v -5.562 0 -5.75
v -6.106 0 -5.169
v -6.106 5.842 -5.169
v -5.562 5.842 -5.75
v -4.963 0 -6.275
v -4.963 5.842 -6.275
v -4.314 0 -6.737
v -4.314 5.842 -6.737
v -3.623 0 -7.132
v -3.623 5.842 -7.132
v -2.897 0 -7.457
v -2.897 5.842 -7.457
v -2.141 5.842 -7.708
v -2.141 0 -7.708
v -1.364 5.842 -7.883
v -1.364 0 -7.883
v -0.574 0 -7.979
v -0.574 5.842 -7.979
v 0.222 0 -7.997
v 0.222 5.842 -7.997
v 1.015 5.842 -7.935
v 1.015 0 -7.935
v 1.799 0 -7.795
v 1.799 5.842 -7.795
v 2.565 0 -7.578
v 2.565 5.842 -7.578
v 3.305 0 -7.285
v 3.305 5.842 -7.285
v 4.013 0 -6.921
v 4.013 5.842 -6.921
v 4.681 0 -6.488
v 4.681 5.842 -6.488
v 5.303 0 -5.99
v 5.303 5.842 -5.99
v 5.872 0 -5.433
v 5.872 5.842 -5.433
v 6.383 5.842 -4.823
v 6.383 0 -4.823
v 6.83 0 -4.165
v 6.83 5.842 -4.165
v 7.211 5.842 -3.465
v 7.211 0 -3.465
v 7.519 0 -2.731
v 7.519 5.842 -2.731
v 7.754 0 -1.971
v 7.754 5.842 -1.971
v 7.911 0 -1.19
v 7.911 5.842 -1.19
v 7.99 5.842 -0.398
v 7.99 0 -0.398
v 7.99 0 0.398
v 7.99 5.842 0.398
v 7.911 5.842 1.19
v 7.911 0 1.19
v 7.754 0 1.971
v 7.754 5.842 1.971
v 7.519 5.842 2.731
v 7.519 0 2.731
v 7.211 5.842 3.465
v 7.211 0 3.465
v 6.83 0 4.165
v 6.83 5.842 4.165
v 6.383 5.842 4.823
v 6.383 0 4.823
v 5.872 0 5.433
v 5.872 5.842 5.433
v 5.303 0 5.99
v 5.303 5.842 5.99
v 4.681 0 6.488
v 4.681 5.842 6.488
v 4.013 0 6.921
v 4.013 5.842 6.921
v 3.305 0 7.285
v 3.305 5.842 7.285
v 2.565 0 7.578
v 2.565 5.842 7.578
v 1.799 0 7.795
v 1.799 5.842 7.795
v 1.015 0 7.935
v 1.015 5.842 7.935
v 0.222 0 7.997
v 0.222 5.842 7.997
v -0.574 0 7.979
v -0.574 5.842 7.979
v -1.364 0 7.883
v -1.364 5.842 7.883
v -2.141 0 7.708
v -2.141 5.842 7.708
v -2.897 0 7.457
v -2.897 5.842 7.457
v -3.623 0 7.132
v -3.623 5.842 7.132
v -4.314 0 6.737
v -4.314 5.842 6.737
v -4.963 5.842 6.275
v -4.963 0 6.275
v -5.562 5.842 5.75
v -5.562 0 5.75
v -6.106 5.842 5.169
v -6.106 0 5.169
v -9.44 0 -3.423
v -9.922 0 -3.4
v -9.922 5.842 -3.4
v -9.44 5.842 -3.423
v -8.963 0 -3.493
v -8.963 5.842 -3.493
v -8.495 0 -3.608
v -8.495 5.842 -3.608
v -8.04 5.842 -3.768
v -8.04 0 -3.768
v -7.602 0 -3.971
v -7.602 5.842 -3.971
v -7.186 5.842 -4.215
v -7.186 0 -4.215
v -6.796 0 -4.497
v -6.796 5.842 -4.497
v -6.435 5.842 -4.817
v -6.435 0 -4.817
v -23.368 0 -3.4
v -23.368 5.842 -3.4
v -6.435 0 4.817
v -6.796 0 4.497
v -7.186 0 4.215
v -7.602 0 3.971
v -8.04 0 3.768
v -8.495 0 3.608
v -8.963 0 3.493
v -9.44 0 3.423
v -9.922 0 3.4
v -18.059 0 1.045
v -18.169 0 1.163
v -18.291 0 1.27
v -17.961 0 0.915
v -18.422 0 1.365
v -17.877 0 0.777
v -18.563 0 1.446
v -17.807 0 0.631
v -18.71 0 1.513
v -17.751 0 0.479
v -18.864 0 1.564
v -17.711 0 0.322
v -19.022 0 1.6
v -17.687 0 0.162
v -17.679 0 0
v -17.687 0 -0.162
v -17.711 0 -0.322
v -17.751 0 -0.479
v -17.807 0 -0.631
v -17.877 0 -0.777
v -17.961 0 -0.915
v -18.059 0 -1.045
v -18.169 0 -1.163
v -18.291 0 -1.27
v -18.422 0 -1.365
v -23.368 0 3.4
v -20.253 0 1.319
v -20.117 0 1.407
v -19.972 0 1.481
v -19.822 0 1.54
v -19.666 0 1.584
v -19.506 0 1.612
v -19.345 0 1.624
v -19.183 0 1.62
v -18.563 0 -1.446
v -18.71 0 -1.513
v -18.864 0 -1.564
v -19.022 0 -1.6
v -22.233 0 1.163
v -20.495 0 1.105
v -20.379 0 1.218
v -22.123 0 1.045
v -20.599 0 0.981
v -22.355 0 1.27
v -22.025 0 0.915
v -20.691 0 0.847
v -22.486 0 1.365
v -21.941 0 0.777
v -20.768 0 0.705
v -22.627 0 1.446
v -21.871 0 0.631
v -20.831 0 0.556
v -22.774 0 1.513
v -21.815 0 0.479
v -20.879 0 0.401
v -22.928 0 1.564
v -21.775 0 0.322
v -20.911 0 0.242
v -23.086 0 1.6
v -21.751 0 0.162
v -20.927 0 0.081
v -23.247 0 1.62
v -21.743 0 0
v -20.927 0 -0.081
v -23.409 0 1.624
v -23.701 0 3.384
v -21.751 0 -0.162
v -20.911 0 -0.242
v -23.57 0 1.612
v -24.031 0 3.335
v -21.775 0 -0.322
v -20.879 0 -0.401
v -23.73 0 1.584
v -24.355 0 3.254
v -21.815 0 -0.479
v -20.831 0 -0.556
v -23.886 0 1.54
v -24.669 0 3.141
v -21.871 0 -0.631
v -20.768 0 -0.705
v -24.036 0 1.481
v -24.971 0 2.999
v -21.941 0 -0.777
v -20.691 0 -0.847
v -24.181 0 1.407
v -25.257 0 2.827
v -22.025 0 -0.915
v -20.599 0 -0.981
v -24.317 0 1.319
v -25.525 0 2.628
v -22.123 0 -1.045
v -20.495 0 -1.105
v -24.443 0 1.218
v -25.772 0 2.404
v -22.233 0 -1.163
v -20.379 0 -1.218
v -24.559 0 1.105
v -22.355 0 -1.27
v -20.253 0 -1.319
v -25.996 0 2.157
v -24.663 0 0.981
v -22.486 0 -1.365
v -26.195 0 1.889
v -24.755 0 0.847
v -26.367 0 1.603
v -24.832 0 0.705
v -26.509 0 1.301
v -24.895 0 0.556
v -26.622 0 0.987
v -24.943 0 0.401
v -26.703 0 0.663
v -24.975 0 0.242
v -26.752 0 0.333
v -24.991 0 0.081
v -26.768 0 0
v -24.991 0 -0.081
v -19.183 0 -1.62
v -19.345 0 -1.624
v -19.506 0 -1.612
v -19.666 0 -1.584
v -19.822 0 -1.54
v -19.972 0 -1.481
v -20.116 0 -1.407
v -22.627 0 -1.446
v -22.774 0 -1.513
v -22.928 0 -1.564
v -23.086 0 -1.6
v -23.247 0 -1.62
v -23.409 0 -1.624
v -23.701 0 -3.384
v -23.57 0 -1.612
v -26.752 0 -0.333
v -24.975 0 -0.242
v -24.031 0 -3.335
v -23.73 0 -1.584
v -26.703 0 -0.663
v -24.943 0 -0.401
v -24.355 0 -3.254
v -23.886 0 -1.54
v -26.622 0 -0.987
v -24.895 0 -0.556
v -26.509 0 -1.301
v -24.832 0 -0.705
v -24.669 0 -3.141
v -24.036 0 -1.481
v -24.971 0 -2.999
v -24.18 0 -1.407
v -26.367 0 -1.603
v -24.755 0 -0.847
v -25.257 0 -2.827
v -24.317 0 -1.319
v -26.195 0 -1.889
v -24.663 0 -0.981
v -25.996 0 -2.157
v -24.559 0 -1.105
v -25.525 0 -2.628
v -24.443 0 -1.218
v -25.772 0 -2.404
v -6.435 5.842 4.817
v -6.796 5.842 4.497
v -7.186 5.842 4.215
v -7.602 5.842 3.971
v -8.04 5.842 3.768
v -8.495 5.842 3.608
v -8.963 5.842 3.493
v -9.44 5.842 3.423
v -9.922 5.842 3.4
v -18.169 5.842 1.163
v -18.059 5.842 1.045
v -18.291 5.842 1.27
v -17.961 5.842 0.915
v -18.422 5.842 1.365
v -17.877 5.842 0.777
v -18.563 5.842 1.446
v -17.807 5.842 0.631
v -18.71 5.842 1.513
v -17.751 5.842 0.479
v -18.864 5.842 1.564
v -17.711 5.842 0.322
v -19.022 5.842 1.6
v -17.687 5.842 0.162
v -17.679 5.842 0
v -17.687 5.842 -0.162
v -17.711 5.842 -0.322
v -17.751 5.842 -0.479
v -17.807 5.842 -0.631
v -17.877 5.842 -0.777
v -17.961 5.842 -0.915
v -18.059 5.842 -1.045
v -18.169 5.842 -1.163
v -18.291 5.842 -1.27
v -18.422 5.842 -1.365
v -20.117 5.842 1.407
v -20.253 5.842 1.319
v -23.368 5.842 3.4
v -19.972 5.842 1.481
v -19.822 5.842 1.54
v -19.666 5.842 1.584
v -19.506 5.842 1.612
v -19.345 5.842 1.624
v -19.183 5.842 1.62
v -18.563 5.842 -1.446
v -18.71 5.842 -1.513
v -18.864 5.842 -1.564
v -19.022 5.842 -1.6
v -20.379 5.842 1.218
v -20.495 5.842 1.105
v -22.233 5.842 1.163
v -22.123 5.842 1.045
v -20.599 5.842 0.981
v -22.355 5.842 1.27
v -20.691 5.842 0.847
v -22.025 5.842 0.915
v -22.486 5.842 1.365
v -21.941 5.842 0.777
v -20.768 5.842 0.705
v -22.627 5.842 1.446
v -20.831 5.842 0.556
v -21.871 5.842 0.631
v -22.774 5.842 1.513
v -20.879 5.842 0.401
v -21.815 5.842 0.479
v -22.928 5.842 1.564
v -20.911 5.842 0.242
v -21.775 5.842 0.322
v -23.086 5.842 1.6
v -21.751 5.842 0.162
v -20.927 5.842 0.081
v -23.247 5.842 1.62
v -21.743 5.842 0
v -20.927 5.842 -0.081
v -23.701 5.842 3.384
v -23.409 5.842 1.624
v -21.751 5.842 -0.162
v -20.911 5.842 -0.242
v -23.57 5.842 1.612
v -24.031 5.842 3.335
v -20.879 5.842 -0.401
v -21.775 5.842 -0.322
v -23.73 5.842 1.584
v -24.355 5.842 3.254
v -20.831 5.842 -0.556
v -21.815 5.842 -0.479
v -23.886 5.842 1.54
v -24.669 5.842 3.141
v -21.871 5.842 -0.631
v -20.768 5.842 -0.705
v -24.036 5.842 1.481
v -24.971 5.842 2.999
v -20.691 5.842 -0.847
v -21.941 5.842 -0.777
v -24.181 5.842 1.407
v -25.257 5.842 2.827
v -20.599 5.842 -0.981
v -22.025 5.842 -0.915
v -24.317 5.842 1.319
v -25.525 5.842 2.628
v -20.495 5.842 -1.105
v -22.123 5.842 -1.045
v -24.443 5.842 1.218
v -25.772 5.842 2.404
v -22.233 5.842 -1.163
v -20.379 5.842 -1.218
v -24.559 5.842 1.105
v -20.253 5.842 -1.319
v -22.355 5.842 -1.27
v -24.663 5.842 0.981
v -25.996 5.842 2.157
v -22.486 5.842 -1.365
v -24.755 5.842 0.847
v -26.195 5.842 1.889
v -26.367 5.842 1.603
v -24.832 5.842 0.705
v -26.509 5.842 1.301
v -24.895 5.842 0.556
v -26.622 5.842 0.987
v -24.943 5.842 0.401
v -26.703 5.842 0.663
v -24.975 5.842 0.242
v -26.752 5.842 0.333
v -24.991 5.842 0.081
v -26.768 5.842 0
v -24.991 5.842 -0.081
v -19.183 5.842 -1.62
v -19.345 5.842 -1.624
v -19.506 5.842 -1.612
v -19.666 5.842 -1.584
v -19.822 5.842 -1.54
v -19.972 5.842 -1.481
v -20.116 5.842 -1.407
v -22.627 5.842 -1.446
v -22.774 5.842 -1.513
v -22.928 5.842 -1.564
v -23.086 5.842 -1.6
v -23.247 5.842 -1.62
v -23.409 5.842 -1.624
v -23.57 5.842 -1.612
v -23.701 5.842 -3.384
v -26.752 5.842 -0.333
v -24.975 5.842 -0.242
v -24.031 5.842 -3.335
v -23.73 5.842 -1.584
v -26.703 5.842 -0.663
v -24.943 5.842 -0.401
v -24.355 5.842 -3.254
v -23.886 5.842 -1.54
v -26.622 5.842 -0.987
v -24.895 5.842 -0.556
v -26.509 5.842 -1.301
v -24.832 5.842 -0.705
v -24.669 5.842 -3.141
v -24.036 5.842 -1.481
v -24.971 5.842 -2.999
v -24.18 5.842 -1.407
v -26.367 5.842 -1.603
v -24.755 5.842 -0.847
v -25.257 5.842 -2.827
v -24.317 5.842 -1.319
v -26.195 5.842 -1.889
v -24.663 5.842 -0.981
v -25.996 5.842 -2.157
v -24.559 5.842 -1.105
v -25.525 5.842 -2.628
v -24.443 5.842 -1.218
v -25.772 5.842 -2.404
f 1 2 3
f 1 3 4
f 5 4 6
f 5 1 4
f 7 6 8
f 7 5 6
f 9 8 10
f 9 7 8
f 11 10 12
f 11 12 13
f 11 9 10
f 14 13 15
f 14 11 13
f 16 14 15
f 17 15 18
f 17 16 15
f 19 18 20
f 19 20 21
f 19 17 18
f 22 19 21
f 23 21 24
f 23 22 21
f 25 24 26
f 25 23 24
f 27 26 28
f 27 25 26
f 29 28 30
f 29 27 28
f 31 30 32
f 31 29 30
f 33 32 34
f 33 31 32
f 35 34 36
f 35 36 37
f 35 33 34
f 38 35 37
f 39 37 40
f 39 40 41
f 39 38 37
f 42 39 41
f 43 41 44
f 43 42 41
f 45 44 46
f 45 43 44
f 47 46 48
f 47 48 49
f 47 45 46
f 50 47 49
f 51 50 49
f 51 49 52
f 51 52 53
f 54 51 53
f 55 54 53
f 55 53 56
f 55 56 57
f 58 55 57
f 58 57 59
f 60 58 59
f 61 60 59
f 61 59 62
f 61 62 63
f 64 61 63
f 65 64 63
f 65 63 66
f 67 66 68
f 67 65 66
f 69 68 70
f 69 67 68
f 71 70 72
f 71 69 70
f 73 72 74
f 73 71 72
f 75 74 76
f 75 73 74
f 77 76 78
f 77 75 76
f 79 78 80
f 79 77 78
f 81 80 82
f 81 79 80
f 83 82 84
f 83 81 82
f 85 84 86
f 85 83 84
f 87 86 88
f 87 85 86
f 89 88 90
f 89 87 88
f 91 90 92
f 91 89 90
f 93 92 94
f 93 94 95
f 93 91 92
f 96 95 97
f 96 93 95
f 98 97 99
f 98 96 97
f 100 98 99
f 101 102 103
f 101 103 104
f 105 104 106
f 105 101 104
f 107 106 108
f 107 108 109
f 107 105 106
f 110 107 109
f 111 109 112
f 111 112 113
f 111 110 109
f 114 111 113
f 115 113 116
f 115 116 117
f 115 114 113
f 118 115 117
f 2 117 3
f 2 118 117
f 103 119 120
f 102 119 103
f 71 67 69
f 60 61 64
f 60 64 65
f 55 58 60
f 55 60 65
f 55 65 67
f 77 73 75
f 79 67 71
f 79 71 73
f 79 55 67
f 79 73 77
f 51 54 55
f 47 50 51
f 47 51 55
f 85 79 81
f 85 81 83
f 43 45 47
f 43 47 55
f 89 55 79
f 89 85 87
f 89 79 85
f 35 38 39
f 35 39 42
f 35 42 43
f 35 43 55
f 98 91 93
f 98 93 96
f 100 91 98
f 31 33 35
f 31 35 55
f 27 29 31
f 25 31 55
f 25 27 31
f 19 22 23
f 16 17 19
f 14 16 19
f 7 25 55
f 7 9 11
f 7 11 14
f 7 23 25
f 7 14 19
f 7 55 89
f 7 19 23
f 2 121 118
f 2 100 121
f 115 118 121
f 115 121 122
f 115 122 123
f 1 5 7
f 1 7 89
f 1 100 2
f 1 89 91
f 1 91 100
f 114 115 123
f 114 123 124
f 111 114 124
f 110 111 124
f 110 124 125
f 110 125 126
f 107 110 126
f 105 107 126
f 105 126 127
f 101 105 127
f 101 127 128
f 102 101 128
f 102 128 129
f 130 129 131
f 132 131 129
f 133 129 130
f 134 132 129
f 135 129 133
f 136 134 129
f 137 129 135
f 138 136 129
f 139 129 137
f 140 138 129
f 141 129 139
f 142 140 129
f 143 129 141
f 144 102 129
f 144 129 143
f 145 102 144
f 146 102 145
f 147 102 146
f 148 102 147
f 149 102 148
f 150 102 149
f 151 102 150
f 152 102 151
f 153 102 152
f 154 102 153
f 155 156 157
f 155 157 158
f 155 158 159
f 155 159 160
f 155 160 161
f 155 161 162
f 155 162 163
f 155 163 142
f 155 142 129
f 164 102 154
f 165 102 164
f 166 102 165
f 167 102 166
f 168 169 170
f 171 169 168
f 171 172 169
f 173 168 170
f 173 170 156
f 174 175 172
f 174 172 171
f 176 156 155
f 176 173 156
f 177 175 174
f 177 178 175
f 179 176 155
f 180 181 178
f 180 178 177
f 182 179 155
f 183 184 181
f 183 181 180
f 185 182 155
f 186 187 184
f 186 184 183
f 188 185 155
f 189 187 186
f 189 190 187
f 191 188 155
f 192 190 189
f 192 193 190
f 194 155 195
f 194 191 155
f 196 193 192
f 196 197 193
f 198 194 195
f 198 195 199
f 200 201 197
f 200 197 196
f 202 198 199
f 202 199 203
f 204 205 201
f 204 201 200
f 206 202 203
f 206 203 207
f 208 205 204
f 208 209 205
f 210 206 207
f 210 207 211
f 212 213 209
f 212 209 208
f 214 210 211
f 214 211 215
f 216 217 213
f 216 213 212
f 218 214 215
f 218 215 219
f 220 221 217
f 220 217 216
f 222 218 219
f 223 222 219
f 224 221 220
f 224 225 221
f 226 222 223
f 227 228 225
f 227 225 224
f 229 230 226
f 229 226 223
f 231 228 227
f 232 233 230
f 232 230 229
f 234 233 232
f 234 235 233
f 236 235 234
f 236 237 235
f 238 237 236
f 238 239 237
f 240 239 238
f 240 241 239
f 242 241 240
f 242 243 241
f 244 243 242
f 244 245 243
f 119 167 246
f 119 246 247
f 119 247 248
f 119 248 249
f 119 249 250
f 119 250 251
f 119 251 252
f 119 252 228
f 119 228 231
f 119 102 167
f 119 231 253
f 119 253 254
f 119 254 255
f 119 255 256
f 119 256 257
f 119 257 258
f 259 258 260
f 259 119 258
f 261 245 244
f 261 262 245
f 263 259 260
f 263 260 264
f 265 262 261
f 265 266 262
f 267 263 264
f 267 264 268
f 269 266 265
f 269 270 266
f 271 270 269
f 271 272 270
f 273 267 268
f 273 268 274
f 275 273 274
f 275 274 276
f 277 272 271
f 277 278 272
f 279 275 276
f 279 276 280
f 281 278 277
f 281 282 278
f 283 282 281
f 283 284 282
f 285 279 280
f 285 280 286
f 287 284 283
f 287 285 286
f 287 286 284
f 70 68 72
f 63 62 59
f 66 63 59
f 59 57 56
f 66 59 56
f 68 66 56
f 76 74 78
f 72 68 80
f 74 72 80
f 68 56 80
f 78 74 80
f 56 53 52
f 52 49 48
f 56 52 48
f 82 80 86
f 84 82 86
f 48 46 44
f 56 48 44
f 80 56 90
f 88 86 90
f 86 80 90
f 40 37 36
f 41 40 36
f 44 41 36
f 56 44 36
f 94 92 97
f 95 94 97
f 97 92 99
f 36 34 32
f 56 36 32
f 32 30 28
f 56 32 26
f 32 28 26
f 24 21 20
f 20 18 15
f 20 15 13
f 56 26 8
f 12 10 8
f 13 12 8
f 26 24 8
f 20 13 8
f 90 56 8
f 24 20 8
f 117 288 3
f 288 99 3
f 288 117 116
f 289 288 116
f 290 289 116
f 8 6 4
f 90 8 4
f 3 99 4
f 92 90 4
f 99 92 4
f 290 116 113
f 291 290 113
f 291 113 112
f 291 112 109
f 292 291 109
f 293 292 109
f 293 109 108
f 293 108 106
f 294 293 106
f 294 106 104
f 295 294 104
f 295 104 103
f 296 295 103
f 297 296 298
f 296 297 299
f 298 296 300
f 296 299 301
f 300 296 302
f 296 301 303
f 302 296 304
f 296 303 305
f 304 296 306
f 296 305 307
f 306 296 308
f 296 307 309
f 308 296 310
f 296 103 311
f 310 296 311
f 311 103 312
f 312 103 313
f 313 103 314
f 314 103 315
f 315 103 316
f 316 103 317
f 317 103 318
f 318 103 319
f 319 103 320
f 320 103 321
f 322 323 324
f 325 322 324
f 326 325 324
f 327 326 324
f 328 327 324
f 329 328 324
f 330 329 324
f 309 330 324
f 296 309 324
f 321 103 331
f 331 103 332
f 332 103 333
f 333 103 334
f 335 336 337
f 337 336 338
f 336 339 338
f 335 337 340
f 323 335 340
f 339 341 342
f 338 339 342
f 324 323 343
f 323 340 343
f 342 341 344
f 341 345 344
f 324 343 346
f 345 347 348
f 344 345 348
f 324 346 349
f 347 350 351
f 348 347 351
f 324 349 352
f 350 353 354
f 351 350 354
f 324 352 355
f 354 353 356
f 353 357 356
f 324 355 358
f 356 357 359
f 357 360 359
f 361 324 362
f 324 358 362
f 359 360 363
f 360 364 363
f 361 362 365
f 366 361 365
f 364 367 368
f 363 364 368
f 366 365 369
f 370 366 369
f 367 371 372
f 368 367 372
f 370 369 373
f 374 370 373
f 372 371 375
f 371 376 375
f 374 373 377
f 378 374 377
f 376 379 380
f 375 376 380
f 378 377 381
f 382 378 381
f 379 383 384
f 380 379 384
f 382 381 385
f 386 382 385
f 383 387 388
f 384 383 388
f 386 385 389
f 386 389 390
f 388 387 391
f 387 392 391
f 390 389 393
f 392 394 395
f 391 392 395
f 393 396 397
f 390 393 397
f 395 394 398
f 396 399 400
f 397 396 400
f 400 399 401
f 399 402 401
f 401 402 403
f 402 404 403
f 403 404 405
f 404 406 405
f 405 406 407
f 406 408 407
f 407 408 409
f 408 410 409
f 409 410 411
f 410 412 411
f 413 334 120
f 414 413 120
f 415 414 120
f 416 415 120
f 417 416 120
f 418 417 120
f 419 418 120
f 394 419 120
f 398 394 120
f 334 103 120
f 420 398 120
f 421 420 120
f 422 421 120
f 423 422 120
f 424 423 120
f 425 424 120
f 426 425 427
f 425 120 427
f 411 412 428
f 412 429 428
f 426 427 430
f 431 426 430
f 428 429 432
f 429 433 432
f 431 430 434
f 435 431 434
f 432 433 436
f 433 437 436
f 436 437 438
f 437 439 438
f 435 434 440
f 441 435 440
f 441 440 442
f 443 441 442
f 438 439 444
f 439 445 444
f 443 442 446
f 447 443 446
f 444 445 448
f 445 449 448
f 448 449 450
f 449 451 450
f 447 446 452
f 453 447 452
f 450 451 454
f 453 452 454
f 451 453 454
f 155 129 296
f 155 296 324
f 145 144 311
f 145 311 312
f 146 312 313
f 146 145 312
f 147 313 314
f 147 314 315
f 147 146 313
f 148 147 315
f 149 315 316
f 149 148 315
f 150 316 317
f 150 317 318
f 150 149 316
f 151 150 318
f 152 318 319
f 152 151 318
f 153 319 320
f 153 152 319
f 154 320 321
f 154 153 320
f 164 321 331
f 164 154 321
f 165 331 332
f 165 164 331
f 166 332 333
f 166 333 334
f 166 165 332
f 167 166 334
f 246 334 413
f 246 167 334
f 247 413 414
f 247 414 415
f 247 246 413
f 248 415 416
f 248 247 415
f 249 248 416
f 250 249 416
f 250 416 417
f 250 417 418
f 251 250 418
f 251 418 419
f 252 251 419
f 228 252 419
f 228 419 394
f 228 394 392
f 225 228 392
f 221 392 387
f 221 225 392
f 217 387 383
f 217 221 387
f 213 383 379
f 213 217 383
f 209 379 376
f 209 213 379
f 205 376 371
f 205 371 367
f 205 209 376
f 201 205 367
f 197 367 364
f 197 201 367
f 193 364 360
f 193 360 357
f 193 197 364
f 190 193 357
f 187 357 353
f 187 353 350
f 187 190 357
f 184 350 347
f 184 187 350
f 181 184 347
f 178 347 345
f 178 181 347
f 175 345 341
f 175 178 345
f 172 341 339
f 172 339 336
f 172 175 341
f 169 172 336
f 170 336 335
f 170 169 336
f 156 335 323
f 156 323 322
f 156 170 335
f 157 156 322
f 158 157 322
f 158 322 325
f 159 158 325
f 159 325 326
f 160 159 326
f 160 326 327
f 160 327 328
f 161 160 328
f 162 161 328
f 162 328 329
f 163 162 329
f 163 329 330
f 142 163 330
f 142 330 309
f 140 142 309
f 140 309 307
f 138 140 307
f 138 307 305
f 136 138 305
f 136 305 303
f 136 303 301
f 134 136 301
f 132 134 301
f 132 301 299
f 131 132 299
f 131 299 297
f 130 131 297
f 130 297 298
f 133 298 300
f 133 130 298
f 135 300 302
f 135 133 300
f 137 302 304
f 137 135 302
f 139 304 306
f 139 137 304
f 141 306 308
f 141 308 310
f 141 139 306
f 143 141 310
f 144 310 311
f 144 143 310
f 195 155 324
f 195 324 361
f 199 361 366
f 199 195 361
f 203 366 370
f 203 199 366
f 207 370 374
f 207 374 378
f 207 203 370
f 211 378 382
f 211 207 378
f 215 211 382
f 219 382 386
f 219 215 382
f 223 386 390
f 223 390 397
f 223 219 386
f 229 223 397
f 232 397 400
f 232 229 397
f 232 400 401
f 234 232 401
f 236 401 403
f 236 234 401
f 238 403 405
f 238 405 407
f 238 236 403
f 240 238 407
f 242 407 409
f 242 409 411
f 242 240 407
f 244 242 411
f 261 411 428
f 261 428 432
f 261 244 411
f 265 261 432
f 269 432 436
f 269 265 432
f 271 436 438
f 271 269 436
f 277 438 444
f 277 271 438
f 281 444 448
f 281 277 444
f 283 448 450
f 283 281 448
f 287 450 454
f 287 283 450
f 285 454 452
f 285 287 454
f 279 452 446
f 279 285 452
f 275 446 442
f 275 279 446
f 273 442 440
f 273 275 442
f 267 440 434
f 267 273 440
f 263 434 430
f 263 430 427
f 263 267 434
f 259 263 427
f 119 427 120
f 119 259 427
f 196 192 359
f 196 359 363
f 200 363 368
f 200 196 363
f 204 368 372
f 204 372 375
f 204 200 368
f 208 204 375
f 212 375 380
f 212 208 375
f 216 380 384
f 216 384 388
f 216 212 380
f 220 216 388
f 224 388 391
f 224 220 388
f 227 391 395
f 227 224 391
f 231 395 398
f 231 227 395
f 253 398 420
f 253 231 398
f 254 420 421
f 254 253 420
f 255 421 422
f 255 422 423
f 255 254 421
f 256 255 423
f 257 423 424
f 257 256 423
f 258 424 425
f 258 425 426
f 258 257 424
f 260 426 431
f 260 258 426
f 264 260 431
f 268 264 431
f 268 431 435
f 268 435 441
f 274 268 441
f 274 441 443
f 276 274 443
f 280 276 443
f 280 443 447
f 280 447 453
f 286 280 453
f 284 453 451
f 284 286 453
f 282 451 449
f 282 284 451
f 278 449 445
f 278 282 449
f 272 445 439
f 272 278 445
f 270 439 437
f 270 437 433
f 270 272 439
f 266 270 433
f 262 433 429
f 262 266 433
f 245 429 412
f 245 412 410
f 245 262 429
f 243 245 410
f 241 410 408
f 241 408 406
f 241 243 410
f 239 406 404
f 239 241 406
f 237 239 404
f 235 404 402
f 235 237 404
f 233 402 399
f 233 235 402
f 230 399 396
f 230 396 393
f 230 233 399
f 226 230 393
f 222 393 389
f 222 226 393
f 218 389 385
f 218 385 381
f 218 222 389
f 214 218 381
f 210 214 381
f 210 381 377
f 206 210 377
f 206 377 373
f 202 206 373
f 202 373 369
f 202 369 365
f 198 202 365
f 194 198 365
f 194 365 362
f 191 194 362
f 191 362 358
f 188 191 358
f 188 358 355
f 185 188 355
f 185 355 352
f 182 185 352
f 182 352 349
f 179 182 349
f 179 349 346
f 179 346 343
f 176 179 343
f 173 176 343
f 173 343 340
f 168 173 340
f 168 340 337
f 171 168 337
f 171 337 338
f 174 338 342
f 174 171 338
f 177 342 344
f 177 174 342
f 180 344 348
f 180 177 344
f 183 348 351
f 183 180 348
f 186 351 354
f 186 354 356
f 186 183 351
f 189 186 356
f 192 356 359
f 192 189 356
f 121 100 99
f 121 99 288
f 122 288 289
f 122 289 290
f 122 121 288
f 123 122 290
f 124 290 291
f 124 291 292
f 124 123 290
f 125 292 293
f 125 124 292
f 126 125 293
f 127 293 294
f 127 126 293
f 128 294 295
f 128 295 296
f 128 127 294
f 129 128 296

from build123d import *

# Parameters (mm, degrees)
SKETCH1_R           = 1.625
BOSS_EXTRUDE1_DEPTH = 5.842


with BuildPart() as part:
    # Sketch1 → Boss-Extrude1 (new body)
    with BuildSketch(Plane(origin=(0, 0, 0), x_dir=(1, 0, 0), z_dir=(0, 1, 0))):
        with BuildLine():
            Line((-9.921693404, 3.4), (-23.368, 3.4))
            ThreePointArc((-23.368, 3.4), (-26.768, 0), (-23.368, -3.4))
            Line((-23.368, -3.4), (-9.921693404, -3.4))
            ThreePointArc((-9.921693404, -3.4), (-7.818582155, -3.863820652), (-6.105657479, -5.169230769))
            ThreePointArc((-6.105657479, -5.169230769), (8, 0), (-6.105657479, 5.169230769))
            ThreePointArc((-6.105657479, 5.169230769), (-7.818582155, 3.863820652), (-9.921693404, 3.4))
        make_face()
        with Locations((-23.368, 0)):
            Circle(SKETCH1_R, mode=Mode.SUBTRACT)
        with Locations((-19.304, 0)):
            Circle(SKETCH1_R, mode=Mode.SUBTRACT)
    extrude(amount=BOSS_EXTRUDE1_DEPTH)


solid = part.part
